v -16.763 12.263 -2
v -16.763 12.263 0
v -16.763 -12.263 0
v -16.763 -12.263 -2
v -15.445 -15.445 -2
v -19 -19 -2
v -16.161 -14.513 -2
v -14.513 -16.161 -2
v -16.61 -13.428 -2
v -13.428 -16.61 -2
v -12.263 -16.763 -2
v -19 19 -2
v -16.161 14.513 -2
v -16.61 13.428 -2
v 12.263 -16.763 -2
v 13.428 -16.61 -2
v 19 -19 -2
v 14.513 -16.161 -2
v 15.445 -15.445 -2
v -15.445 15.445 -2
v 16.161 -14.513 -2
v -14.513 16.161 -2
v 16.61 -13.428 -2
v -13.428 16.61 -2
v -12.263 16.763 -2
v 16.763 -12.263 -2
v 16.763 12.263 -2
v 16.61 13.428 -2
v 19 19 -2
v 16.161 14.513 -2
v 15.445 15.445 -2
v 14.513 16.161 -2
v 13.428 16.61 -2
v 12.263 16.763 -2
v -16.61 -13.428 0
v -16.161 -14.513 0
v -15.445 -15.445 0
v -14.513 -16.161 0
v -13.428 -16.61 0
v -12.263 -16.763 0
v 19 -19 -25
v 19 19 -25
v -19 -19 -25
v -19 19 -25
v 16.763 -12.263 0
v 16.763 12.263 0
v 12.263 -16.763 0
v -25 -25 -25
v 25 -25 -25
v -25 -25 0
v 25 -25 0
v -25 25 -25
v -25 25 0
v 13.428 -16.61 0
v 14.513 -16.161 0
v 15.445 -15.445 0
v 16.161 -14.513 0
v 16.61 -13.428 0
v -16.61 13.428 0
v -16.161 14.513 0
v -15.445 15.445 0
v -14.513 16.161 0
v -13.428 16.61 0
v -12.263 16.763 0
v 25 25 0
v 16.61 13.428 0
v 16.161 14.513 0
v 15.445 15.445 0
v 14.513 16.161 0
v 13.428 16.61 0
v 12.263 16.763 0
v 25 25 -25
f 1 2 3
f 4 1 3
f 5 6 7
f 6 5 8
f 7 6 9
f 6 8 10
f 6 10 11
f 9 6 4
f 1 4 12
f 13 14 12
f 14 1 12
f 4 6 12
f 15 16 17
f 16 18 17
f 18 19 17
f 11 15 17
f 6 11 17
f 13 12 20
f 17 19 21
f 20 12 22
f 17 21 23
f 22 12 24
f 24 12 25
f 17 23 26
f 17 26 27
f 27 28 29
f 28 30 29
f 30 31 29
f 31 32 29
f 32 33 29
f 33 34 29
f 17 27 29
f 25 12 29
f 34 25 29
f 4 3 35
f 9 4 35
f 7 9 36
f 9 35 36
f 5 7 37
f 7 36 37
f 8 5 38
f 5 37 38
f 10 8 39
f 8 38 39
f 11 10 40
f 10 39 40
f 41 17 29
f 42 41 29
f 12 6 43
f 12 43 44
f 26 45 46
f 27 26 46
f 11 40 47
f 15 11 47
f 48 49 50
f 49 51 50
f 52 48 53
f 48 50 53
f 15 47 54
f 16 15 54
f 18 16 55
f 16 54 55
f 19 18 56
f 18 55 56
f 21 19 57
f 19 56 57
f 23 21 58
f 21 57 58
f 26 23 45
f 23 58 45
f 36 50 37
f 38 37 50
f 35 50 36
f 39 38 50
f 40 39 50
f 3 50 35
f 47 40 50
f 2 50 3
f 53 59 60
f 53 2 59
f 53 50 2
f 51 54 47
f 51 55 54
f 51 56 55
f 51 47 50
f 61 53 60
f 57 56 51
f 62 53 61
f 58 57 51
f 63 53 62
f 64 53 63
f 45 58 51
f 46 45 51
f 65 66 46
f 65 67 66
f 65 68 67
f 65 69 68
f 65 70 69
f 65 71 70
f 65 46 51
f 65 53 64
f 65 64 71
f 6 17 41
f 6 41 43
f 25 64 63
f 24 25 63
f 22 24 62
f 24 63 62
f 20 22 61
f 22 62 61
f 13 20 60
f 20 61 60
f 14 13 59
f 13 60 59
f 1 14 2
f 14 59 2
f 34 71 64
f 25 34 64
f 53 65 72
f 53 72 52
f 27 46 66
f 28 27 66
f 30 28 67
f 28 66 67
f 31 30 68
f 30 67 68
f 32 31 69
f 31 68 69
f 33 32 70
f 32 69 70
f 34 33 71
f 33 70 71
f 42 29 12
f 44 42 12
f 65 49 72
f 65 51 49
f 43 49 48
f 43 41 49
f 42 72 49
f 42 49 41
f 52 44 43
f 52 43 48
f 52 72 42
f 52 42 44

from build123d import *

# Parameters (mm, degrees)
SKETCH1_W           = 50
SKETCH1_H           = 50
BOSS_EXTRUDE1_DEPTH = 2
SKETCH2_W           = 50
SKETCH2_H           = 50
SKETCH2_W_2         = 38
SKETCH2_H_2         = 38
BOSS_EXTRUDE2_DEPTH = 23


with BuildPart() as part:
    # Sketch1 → Boss-Extrude1 (new body)
    with BuildSketch(Plane.XY):
        Rectangle(SKETCH1_W, SKETCH1_H)
        with BuildLine():
            Line((12.263455967, 16.763455967), (-12.263455967, 16.763455967))
            ThreePointArc((-12.263455967, 16.763455967), (-15.445436483, 15.445436483), (-16.763455967, 12.263455967))
            Line((-16.763455967, 12.263455967), (-16.763455967, -12.263455967))
            ThreePointArc((-16.763455967, -12.263455967), (-15.445436483, -15.445436483), (-12.263455967, -16.763455967))
            Line((-12.263455967, -16.763455967), (12.263455967, -16.763455967))
            ThreePointArc((12.263455967, -16.763455967), (15.445436483, -15.445436483), (16.763455967, -12.263455967))
            Line((16.763455967, -12.263455967), (16.763455967, 12.263455967))
            ThreePointArc((16.763455967, 12.263455967), (15.445436483, 15.445436483), (12.263455967, 16.763455967))
        make_face(mode=Mode.SUBTRACT)
    extrude(amount=-BOSS_EXTRUDE1_DEPTH)

    # Sketch2 → Boss-Extrude2 (add)
    with BuildSketch(Plane(origin=(0, 0, -2), x_dir=(-1, 0, 0), z_dir=(0, 0, -1))):
        Rectangle(SKETCH2_W, SKETCH2_H)
        Rectangle(SKETCH2_W_2, SKETCH2_H_2, mode=Mode.SUBTRACT)
    extrude(amount=BOSS_EXTRUDE2_DEPTH)


solid = part.part
